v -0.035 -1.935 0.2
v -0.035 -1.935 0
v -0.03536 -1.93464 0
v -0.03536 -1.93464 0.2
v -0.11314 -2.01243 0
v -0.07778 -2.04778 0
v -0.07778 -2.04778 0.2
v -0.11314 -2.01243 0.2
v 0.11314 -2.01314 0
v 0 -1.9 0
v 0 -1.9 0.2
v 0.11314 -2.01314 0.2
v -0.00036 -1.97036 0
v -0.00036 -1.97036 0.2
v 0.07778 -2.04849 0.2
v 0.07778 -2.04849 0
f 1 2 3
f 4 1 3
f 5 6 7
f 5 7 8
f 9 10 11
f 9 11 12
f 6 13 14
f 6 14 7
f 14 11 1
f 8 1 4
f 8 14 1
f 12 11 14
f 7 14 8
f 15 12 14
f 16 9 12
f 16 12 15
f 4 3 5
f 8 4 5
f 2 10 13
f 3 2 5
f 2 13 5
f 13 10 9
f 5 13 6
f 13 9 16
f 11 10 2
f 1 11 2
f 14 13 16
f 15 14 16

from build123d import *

# Parameters (mm, degrees)
BOX005_W                  = 0.05
BOX005_H                  = 0.11
BOX005_DEPTH              = 0.2
BOX005_PLACEMENT_ANGLE    = -45
BOX004_W                  = 0.05
BOX004_H                  = 0.16
BOX004_DEPTH              = 0.2
BOX004_PLACEMENT_ANGLE    = 45
FUSION002_PLACEMENT_ANGLE = 180


with BuildPart() as kub005:
    # Box005 → Box005 (new body)
    with BuildSketch(Plane.XY):
        with Locations((0.025, 0.055)):
            Rectangle(BOX005_W, BOX005_H)
    extrude(amount=BOX005_DEPTH)


with BuildPart() as kub005_1:
    # Box005 placement: moved
    add(kub005.part.moved(Location((0, 1.97, 0))).rotate(Axis((0, 1.97, 0), (0, 0, 1)), BOX005_PLACEMENT_ANGLE))


with BuildPart() as fusion002:
    # Box004 → Box004 (new body)
    with BuildSketch(Plane.XY):
        with Locations((0.025, 0.08)):
            Rectangle(BOX004_W, BOX004_H)
    extrude(amount=BOX004_DEPTH)


with BuildPart() as fusion002_1:
    # Box004 placement: moved
    add(fusion002.part.moved(Location((0, 1.9, 0))).rotate(Axis((0, 1.9, 0), (0, 0, 1)), BOX004_PLACEMENT_ANGLE))

    # Fusion002: union Kub005
    add(kub005_1.part)


with BuildPart() as fusion002_2:
    # Fusion002 placement: moved
    add(fusion002_1.part.rotate(Axis((0, 0, 0), (0, 0, 1)), FUSION002_PLACEMENT_ANGLE))


solid = fusion002_2.part
